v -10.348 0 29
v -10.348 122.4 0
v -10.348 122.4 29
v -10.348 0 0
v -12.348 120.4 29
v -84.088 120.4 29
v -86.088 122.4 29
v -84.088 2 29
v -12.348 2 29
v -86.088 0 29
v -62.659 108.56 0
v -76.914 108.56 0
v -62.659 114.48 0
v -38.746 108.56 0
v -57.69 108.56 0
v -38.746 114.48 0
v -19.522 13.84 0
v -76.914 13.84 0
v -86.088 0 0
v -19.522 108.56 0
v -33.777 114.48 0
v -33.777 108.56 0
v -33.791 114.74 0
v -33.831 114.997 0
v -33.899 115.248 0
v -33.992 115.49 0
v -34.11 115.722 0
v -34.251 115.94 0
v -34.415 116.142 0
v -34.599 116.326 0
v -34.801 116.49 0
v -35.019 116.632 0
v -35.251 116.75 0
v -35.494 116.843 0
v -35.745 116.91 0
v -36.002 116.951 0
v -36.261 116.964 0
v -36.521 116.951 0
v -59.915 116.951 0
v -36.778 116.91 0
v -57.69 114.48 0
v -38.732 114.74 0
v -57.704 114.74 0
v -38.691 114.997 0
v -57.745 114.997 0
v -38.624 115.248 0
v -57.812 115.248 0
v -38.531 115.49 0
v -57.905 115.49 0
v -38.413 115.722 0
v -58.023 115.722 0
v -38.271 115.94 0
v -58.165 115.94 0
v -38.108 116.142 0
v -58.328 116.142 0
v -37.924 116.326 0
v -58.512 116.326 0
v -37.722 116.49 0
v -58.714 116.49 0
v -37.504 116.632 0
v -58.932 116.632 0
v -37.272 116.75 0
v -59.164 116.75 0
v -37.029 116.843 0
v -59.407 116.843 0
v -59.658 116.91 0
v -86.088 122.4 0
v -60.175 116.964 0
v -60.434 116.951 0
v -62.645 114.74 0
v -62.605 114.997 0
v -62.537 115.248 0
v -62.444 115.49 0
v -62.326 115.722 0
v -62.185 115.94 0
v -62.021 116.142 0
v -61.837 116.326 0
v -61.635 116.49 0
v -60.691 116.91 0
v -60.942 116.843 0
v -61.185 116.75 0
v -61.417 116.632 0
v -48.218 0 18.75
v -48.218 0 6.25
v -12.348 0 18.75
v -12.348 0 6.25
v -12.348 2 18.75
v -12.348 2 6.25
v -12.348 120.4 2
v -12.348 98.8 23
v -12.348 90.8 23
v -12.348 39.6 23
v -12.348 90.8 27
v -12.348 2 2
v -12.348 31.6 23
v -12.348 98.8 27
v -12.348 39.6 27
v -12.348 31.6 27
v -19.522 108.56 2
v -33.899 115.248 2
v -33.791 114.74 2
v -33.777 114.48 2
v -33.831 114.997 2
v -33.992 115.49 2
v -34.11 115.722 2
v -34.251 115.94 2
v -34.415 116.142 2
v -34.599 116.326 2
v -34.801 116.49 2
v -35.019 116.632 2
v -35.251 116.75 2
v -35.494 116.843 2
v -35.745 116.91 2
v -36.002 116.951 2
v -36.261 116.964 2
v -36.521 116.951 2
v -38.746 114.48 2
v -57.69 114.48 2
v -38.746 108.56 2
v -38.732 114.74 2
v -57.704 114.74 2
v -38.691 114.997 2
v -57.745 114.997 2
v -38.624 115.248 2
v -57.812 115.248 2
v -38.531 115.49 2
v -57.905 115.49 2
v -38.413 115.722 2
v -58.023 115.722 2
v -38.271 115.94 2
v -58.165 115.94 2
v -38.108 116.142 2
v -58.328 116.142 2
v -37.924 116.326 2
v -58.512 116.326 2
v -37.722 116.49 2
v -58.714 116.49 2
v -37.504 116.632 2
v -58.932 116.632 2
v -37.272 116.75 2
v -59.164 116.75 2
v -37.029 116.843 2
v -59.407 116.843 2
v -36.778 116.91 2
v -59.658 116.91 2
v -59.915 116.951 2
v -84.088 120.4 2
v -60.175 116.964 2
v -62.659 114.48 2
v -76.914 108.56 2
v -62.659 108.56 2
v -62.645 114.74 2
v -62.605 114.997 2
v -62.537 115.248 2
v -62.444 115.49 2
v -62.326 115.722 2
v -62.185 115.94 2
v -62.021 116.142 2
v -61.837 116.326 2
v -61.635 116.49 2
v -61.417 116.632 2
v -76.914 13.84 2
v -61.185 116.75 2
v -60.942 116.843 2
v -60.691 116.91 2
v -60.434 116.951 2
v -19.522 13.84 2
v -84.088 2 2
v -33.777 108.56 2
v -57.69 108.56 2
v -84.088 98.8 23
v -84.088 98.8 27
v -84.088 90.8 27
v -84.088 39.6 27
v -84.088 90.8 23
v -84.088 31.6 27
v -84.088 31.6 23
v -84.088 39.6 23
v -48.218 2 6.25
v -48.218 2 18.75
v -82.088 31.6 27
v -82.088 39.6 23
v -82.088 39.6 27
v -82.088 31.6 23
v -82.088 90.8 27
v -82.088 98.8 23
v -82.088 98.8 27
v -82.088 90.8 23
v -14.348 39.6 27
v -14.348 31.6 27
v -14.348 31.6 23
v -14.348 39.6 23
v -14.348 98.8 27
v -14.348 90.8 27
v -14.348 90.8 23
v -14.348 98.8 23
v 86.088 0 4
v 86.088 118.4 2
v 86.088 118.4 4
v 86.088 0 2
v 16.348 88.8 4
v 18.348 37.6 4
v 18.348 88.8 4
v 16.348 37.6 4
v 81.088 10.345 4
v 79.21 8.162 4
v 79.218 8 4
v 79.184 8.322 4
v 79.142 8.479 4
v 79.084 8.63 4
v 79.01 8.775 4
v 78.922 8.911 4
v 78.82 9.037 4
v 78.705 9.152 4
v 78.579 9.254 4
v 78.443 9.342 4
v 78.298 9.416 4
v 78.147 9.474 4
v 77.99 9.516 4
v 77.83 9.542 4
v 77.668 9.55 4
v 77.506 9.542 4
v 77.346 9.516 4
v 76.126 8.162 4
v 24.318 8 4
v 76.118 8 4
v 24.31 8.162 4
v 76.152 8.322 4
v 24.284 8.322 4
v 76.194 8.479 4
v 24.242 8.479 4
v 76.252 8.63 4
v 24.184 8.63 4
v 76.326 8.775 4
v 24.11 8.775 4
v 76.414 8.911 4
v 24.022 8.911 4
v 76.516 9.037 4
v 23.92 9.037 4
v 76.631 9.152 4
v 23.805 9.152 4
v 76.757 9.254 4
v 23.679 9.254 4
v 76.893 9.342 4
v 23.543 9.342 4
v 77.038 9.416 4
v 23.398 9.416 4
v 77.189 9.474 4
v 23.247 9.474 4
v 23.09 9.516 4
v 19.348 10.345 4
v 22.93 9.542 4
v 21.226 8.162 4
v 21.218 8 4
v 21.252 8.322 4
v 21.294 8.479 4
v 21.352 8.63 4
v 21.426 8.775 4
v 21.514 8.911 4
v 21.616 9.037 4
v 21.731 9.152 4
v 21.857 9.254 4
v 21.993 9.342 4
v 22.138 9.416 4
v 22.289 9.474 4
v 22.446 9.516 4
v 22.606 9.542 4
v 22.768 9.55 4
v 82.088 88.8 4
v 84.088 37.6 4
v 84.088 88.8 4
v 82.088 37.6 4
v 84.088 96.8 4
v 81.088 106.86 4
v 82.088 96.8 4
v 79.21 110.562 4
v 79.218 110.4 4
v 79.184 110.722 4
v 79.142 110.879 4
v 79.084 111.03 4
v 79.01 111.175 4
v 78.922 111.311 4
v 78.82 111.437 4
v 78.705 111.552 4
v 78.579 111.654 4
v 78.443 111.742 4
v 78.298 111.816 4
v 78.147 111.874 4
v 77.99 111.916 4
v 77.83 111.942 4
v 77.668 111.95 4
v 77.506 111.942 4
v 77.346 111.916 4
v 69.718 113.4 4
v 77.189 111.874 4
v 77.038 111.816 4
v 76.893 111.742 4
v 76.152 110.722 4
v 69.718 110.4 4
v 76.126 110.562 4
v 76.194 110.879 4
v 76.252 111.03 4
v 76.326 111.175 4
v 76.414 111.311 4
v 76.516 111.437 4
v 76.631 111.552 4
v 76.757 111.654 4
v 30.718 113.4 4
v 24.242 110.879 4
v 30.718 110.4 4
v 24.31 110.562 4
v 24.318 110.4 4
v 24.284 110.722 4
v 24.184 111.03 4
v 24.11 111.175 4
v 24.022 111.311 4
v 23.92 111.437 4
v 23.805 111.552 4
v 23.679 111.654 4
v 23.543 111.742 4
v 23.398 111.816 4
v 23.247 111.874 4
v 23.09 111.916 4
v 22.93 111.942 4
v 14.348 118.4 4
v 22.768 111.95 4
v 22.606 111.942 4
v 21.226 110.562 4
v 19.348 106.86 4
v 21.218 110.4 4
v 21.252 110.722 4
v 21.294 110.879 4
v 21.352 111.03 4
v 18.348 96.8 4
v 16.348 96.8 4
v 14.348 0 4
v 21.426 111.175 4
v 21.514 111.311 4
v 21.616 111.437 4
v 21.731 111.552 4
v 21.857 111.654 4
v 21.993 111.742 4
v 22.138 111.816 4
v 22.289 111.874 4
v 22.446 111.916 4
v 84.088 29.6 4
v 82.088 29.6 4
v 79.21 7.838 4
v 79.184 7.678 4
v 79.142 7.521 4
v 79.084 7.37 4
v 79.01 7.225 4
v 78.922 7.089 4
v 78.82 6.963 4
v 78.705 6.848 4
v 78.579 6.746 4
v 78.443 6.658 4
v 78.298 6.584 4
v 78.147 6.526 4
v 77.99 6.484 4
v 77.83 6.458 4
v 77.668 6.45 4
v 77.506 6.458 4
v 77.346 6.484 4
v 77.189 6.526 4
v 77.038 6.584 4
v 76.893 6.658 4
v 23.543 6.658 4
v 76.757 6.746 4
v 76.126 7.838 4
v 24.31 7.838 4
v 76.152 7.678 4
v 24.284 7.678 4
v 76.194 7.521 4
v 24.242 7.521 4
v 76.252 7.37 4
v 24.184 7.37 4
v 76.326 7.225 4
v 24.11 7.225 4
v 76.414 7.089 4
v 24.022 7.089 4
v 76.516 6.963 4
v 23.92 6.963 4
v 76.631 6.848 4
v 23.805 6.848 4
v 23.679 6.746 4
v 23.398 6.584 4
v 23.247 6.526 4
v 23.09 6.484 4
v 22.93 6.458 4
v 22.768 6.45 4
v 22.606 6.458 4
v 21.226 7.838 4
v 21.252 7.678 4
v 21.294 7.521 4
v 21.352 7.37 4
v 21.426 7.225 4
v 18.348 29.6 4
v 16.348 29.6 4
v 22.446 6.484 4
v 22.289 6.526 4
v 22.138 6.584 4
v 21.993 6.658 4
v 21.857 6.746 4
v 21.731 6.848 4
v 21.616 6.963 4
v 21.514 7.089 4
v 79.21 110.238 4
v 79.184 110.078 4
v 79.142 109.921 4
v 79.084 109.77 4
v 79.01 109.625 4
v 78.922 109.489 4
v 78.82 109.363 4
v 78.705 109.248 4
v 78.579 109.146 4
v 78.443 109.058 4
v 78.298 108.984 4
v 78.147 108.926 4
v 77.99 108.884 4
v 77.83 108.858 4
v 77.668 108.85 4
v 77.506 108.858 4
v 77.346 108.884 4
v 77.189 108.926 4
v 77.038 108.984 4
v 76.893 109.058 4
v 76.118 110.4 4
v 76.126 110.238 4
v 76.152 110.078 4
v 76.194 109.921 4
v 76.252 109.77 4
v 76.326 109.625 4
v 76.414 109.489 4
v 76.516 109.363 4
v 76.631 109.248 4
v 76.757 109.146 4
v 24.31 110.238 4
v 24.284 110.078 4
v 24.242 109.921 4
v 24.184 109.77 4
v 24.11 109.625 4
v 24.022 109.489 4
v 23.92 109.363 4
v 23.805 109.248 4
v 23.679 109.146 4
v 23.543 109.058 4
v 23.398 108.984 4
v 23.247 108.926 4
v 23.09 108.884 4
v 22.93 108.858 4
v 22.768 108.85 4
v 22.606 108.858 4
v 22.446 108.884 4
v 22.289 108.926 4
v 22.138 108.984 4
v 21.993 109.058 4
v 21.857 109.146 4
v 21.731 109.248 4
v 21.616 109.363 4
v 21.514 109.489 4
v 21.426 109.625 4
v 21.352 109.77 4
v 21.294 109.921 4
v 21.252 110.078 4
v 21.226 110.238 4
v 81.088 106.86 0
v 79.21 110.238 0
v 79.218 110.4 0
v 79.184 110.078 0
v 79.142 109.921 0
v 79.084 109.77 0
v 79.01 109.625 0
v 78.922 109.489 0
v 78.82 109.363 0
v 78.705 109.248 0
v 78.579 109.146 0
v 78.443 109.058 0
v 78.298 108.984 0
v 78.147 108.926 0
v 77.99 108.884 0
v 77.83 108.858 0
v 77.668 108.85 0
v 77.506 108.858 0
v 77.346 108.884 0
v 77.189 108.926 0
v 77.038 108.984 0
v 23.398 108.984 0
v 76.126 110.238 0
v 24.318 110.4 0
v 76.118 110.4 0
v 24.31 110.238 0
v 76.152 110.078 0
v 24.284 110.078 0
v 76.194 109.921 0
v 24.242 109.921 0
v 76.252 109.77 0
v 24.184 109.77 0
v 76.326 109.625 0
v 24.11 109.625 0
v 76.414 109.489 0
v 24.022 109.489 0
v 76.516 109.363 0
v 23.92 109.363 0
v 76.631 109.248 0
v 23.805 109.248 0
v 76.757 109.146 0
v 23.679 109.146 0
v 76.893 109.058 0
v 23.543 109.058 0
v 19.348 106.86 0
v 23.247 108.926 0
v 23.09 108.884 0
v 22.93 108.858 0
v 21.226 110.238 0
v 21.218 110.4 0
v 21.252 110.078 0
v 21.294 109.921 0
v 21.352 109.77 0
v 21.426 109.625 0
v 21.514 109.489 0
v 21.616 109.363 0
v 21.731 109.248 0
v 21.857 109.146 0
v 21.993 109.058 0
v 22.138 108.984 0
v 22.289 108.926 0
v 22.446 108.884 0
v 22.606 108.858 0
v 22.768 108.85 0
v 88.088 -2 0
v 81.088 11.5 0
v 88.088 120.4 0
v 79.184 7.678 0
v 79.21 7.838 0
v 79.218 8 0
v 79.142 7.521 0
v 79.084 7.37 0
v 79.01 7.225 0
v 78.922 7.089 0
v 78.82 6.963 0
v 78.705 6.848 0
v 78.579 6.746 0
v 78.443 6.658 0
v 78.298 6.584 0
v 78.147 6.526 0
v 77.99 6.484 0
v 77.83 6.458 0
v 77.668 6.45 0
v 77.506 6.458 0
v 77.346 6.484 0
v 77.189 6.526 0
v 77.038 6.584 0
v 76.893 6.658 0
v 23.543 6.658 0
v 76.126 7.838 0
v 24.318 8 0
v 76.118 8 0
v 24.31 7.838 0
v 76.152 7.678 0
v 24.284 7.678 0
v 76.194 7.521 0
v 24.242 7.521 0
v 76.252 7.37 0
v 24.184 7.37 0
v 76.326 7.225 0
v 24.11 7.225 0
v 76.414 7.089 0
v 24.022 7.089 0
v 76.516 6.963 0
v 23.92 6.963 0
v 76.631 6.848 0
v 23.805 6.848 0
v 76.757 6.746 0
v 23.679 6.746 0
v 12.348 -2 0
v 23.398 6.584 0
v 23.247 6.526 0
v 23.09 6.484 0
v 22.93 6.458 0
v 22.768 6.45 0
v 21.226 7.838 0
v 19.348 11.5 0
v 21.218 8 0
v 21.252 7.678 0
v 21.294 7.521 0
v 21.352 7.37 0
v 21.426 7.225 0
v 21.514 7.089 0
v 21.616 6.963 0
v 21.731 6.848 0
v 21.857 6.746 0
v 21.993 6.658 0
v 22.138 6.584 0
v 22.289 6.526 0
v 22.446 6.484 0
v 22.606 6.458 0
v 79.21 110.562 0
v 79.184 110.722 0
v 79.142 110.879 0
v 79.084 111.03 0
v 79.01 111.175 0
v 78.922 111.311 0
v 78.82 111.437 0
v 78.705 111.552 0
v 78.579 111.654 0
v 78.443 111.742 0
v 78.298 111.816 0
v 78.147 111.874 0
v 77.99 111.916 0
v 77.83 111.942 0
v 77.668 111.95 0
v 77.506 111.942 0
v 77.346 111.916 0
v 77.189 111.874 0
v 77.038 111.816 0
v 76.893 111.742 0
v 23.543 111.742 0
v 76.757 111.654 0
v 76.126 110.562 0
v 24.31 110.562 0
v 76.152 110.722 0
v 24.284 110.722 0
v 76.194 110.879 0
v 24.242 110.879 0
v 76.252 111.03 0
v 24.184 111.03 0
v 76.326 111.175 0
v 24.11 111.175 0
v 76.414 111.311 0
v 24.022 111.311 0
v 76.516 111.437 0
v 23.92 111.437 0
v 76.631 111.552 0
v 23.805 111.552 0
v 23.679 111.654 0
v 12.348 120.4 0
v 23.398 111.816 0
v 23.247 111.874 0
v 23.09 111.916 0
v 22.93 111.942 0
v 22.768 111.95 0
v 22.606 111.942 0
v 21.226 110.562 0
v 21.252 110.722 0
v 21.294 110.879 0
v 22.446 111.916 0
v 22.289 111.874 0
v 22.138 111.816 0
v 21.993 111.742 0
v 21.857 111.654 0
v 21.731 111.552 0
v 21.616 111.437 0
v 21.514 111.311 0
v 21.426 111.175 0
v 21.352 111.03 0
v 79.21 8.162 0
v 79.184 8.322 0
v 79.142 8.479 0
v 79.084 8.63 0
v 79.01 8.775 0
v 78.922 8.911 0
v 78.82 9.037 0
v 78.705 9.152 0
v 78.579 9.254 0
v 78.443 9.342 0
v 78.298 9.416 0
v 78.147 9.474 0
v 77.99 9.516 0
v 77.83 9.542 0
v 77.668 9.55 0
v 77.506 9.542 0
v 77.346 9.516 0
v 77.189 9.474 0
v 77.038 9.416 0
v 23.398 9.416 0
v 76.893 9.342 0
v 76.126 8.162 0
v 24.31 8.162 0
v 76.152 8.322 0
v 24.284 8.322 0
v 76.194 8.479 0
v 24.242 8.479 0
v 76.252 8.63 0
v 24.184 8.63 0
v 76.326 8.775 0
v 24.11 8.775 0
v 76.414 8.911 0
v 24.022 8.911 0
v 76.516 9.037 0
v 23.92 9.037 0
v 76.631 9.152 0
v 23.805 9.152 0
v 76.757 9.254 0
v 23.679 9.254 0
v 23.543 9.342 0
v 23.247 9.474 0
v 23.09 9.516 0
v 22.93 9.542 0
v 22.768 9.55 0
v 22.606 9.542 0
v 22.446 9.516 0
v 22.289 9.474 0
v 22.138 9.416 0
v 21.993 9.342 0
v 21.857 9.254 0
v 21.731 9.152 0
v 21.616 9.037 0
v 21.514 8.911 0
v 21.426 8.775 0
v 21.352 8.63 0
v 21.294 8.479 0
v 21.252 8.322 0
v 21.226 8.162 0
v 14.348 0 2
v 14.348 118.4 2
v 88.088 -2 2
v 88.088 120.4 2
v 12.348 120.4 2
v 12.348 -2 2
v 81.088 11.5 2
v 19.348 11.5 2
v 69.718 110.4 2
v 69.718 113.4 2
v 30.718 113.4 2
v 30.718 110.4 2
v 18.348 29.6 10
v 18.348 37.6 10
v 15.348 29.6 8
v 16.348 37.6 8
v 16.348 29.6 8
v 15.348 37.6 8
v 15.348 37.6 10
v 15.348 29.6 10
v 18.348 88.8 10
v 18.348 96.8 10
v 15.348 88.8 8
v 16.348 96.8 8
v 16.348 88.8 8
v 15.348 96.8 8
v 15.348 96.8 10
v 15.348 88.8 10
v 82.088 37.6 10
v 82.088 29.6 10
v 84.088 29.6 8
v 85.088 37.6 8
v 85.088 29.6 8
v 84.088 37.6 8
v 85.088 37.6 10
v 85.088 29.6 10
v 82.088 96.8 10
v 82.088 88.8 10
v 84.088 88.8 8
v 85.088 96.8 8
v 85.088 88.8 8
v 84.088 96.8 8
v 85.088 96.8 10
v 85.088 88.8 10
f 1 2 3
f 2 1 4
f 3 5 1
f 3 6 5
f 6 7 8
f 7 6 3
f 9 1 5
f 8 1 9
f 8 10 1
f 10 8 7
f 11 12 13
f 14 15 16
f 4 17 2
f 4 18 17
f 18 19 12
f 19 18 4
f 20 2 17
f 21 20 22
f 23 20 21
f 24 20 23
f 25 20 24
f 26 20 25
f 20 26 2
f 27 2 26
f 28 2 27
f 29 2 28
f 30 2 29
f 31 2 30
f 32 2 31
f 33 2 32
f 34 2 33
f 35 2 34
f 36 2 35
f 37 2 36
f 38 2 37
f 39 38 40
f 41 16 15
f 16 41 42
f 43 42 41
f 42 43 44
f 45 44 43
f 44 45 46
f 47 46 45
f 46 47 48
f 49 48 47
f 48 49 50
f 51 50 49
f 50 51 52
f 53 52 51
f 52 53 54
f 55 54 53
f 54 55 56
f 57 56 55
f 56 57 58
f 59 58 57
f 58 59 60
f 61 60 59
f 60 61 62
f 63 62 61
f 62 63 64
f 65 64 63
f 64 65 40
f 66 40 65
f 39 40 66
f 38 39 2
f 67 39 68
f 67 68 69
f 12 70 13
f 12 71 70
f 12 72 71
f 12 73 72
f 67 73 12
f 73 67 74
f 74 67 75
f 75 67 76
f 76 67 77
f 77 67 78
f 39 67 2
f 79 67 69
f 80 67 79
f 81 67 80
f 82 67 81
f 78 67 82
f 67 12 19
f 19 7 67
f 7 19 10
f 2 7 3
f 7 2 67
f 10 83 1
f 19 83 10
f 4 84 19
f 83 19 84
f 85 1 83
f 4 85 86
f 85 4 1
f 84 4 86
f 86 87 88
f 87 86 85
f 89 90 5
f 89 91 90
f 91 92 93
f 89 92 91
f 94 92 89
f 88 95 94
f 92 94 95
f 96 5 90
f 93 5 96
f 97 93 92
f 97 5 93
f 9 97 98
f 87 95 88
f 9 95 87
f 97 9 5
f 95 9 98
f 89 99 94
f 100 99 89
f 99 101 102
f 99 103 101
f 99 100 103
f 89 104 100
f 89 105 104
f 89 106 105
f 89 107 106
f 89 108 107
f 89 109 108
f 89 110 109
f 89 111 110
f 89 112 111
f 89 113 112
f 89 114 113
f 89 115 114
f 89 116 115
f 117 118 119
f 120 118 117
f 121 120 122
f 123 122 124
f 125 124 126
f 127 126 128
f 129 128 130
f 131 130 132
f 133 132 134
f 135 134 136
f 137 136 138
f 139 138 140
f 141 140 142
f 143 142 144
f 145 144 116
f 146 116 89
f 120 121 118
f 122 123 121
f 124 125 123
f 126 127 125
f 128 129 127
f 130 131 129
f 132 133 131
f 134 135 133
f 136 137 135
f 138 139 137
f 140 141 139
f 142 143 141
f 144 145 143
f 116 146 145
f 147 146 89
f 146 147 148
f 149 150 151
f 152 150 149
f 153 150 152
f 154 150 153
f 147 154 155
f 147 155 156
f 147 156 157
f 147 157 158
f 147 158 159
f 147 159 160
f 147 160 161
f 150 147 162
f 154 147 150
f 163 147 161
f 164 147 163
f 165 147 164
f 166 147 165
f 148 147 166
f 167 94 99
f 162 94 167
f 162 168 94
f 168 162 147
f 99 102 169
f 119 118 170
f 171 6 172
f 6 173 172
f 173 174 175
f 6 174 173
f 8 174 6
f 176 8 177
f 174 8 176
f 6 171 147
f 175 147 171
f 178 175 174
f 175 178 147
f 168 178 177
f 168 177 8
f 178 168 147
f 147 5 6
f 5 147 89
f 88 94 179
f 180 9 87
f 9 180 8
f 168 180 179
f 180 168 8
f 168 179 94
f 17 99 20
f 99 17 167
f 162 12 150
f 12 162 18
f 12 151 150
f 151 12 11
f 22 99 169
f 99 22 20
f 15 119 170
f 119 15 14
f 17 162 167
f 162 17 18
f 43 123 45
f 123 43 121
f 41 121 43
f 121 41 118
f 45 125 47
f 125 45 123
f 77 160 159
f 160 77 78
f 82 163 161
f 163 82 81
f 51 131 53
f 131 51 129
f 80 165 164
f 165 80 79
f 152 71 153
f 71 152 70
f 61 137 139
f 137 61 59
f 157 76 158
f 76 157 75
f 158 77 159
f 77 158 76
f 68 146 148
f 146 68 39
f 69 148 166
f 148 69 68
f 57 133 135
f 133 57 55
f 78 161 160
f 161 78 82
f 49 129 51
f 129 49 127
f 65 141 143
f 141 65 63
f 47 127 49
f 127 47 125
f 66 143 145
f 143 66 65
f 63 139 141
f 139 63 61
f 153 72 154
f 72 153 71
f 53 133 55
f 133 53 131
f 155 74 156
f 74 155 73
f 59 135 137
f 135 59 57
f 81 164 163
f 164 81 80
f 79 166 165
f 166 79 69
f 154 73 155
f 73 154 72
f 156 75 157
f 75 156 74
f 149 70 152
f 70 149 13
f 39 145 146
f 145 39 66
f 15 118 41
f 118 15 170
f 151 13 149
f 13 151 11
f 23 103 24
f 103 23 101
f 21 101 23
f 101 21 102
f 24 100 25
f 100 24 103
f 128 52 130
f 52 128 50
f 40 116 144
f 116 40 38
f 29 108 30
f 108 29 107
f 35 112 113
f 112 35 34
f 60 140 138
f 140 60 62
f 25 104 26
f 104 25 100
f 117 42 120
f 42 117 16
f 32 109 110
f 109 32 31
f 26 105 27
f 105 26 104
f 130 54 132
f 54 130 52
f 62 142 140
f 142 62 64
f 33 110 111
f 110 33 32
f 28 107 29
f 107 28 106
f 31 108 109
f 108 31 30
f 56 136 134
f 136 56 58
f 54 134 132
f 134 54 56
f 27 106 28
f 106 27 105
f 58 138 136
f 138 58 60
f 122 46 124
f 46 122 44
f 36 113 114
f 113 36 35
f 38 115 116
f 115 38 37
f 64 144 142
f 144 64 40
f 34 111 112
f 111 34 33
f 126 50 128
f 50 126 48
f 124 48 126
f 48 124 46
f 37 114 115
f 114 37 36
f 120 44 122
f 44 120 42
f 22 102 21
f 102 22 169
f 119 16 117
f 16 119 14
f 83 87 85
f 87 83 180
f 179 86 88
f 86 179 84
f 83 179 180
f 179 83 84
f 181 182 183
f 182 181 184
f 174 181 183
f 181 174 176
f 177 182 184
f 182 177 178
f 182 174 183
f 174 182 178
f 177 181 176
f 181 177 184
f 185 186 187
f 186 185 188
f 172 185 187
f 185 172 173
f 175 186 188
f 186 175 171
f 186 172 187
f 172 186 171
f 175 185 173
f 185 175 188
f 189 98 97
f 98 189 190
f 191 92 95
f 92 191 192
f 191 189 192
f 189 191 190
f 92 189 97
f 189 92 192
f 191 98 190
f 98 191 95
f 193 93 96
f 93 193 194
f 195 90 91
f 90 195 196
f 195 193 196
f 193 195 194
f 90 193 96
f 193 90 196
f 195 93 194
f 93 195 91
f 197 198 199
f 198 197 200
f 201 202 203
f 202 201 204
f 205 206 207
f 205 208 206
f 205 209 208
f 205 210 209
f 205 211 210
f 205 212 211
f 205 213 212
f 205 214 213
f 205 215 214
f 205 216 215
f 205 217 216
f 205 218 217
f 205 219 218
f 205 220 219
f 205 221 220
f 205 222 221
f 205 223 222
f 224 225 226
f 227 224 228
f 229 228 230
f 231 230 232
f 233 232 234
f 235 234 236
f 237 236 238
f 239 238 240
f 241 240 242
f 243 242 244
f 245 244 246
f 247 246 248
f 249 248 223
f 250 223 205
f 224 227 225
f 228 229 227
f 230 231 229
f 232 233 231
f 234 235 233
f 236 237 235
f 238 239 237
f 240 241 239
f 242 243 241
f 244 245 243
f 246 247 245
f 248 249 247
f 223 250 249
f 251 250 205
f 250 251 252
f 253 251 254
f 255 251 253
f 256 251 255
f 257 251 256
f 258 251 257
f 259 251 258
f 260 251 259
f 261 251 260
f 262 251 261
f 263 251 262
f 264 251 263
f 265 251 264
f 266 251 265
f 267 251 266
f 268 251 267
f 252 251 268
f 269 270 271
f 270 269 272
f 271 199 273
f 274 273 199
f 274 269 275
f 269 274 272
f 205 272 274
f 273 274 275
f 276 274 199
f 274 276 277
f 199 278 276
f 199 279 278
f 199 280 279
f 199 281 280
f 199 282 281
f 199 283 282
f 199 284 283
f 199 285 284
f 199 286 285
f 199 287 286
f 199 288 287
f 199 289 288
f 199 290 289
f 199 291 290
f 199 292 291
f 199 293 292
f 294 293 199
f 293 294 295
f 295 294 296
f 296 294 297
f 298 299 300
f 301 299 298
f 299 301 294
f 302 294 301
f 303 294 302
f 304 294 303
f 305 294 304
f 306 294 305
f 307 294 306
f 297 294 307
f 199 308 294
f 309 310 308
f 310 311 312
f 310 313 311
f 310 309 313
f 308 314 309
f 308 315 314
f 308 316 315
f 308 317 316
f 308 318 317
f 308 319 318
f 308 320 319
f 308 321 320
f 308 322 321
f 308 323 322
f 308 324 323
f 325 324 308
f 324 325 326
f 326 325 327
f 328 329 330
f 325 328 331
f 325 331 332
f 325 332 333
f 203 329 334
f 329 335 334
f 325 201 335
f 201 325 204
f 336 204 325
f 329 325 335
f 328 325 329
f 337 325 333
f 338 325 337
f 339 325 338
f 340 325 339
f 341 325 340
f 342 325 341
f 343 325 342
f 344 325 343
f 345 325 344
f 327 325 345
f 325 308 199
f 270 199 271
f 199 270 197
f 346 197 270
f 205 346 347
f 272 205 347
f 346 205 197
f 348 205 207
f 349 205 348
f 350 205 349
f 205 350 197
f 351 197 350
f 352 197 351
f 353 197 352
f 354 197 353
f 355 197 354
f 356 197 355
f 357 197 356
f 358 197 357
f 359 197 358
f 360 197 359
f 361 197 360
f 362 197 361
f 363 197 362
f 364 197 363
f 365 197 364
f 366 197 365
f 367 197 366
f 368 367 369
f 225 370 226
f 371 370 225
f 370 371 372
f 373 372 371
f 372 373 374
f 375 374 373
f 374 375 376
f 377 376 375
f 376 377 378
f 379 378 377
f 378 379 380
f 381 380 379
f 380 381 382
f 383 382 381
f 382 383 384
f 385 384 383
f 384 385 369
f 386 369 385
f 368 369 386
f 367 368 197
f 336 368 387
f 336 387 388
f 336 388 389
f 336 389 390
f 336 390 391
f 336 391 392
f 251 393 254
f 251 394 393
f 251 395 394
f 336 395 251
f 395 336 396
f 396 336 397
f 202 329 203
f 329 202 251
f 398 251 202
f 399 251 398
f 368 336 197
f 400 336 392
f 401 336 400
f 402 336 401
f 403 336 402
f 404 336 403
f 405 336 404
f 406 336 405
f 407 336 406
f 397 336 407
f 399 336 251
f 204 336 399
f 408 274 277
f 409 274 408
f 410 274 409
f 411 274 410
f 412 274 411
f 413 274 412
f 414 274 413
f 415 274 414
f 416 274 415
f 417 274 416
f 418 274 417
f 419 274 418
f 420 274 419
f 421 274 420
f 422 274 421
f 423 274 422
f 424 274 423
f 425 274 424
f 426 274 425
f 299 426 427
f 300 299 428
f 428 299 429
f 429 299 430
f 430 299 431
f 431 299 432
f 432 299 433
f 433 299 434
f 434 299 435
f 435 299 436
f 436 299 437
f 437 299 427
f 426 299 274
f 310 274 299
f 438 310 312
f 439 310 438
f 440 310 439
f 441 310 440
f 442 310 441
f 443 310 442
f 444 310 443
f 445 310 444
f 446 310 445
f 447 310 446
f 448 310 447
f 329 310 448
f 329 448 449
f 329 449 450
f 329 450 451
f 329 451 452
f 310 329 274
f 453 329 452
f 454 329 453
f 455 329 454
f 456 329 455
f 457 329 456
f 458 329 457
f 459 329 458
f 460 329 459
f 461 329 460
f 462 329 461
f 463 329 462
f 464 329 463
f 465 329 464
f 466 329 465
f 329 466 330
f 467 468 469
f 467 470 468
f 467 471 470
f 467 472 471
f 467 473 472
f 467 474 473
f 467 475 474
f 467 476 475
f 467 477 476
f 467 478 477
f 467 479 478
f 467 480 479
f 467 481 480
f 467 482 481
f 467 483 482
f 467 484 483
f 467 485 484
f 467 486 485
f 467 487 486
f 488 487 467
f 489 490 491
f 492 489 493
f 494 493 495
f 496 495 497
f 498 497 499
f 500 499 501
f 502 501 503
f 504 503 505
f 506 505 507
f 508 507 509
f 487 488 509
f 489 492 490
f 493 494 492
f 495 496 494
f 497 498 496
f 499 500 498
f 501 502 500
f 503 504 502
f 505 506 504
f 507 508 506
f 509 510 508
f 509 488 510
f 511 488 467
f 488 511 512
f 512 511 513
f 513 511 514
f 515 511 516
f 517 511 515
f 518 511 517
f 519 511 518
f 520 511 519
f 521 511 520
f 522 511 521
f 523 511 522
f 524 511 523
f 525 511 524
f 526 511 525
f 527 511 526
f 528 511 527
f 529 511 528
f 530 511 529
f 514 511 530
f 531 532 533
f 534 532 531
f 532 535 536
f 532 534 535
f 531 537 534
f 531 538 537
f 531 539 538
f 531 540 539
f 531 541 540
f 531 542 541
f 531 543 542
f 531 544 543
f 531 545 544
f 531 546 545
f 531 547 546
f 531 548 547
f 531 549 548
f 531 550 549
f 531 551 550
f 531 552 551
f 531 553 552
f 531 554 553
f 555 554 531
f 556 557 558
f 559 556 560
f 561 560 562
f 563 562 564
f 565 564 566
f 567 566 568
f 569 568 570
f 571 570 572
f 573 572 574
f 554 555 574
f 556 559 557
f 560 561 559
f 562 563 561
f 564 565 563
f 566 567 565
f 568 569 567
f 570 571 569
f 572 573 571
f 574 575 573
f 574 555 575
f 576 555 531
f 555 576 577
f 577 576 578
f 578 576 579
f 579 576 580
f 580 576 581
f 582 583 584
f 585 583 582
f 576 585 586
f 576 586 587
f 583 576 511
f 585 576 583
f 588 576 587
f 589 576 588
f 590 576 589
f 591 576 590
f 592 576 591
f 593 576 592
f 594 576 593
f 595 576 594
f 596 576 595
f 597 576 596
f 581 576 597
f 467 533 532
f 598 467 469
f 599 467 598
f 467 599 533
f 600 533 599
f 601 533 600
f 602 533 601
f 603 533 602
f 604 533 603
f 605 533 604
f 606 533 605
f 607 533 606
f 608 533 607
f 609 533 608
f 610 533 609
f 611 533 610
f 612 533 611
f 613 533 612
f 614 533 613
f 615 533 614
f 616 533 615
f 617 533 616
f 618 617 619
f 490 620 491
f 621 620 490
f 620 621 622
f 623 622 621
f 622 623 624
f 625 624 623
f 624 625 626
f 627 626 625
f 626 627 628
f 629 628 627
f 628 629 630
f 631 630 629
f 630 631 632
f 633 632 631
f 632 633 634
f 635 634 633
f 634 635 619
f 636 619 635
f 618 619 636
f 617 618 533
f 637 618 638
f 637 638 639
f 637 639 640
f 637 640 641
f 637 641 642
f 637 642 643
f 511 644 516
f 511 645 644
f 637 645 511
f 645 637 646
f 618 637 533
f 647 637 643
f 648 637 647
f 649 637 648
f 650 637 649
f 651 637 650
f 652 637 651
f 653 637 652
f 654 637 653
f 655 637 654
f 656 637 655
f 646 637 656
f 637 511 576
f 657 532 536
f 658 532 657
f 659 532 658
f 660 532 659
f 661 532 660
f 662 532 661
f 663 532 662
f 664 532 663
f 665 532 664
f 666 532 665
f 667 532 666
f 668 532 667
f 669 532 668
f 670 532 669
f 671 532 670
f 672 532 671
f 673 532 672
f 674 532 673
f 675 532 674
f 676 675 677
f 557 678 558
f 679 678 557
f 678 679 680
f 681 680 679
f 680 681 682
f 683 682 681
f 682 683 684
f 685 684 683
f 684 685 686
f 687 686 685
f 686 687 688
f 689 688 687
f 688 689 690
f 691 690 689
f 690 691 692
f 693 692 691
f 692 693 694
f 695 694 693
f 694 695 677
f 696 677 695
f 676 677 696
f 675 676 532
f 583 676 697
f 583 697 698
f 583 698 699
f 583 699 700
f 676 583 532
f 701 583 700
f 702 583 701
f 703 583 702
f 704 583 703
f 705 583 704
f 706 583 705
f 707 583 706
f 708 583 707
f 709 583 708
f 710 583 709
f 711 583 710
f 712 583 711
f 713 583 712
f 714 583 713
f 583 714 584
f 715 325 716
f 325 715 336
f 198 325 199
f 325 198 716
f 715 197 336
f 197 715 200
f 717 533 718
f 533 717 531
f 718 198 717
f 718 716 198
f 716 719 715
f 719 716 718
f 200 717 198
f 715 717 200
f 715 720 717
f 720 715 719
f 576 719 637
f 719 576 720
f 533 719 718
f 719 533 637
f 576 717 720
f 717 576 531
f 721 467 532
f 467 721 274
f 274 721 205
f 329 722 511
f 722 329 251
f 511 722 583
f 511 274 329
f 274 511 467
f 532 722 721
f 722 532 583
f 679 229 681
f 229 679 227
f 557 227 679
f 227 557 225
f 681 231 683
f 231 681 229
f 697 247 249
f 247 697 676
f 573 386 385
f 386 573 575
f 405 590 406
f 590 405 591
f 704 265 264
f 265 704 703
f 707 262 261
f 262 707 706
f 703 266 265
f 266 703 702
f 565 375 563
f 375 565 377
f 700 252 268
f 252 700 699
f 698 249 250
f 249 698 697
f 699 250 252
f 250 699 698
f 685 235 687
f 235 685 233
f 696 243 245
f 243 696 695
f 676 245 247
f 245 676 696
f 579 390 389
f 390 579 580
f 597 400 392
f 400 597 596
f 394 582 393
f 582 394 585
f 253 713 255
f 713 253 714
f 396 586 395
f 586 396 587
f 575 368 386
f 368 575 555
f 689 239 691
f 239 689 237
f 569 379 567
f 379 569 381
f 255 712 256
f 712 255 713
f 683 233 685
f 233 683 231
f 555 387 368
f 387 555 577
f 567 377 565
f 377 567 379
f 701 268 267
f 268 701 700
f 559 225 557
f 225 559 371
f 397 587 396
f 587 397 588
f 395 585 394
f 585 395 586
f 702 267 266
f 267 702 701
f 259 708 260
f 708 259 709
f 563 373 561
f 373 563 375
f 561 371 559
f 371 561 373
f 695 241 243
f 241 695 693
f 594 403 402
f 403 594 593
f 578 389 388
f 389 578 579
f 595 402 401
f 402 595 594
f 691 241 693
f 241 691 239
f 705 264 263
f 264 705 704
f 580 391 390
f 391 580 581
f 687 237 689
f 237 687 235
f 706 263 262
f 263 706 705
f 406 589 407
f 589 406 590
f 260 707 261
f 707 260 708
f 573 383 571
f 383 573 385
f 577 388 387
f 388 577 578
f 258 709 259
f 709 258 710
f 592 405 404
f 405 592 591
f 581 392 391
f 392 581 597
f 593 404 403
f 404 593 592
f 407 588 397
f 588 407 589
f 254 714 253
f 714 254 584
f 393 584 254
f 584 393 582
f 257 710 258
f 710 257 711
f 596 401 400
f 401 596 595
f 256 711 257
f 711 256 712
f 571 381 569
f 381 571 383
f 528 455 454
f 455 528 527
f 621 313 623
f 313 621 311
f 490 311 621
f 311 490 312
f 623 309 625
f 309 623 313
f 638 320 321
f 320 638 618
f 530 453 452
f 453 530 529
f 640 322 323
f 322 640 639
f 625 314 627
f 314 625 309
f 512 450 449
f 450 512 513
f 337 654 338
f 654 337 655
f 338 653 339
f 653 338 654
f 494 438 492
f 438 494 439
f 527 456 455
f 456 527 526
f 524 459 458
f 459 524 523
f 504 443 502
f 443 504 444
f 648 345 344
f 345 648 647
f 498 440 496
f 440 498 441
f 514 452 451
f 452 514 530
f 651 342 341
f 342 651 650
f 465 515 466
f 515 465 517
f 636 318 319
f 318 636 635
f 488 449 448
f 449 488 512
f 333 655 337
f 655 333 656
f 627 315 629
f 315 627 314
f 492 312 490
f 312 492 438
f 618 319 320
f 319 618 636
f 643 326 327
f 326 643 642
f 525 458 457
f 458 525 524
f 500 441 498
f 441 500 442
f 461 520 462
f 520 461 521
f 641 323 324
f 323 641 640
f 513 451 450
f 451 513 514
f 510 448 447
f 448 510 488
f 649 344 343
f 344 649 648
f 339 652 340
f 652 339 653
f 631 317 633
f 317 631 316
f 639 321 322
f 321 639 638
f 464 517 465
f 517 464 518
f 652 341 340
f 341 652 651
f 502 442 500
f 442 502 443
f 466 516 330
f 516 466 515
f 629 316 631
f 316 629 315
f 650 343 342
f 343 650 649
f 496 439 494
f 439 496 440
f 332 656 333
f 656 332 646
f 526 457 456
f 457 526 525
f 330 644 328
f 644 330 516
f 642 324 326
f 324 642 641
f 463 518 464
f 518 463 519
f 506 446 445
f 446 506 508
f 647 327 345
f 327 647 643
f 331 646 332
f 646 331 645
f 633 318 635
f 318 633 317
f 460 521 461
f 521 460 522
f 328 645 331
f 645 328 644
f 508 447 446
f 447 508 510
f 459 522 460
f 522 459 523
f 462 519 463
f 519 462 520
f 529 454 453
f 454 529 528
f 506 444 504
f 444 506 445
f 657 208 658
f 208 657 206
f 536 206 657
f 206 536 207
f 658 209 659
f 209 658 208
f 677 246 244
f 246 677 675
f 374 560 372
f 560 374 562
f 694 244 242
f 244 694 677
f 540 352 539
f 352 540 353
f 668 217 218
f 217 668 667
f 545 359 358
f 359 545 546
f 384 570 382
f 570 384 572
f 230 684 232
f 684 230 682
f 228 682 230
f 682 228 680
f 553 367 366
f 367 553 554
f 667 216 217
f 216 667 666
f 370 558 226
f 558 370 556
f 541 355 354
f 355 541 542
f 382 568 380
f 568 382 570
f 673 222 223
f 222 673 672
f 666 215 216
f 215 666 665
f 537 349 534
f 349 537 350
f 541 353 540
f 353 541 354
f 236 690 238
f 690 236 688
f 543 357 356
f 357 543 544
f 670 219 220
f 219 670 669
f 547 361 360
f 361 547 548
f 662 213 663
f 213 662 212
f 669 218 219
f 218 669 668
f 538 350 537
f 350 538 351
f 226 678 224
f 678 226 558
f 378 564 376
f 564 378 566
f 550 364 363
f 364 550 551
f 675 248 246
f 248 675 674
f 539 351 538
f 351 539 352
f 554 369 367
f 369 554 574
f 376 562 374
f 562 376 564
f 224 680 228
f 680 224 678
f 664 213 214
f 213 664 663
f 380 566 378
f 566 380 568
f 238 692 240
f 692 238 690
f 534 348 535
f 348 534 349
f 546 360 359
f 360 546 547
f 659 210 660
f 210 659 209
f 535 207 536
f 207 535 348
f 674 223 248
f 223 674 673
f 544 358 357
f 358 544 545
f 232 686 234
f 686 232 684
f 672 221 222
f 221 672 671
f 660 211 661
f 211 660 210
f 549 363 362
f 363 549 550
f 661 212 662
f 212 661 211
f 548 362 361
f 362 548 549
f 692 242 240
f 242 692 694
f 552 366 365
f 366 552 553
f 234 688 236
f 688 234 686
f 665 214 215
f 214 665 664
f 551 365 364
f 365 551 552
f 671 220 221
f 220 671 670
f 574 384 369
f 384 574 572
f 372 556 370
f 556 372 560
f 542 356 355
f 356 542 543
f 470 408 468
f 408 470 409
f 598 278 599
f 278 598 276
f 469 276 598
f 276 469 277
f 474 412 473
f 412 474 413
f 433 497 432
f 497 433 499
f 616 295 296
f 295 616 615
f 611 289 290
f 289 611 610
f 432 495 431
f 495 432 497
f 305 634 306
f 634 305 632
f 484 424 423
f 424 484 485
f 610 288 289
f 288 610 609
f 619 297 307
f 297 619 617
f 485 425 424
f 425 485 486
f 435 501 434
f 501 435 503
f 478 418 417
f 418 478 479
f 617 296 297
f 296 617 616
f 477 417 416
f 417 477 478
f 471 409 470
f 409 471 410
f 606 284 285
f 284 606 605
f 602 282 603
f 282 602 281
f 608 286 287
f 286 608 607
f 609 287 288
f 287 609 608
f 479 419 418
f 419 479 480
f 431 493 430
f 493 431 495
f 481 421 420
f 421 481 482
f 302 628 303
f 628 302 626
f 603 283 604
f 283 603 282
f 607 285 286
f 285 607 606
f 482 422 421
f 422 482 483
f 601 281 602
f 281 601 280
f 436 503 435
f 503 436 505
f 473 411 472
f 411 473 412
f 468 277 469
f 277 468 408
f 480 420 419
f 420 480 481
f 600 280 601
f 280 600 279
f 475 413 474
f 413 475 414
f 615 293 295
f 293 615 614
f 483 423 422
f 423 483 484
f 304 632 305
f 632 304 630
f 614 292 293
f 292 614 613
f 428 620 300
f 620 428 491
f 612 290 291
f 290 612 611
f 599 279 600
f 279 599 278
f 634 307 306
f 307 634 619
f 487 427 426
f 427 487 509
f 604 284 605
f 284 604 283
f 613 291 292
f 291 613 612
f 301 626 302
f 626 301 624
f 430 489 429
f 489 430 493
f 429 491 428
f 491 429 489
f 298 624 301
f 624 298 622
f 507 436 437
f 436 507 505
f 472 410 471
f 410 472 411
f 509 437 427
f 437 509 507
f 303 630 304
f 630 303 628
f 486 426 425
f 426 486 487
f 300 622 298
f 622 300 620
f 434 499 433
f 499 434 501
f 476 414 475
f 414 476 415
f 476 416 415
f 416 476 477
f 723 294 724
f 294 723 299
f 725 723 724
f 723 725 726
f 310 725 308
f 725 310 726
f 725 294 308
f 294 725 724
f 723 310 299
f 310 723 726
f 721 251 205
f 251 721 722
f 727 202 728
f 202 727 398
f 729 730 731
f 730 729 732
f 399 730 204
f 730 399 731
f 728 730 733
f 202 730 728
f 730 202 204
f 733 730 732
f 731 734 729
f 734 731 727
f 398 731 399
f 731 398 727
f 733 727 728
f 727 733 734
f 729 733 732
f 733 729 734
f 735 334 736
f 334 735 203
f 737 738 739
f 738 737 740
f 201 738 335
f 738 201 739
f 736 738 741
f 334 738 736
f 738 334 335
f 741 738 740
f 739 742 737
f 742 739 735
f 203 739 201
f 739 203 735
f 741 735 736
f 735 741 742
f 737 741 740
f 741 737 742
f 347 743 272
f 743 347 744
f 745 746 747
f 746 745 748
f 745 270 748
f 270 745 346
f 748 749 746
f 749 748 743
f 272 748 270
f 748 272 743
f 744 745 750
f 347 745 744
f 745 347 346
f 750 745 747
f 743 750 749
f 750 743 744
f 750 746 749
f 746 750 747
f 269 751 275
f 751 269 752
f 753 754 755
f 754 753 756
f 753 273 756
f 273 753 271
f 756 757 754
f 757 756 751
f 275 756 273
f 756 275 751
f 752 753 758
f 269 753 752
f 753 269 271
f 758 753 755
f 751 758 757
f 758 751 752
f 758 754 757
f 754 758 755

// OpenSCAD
// PDX Hackerspace Exit Poll
// https://www.aliexpress.us/item/3256802965763349.html
// https://www.aliexpress.us/item/3256804835346770.html
$fn = 60;

render_stl = 0;
// 3.5"
// display_width = 56;
// display_height = 98;

// 4.0"
display_width = 61.74;
display_height = 108.4;

hole_radius = 1.55; //For a diameter of 3.1, 3mm+clearance for an M3 Screw
hole_width_offset = 3.42;
hole_height_offset = 3;

bottom_margin = 6.5;
top_margin = 6.54;


// "active area" 48.96x73.44(mm)
//active_width = 48.96;
//active_height = 73.44;

led_width = display_width;
led_height = display_height - bottom_margin - top_margin;

case_width = display_width + 10;
case_height = display_height + 10;
case_depth = 25;

thickness = 2;

screw_hole_diameter = 5/32*25.4 + 1;;

catch_height = 4;
catch_width = 8;

usb_cutout_width = 20;
usb_cutout_height = 8;

module catch() {
    cube([thickness, catch_width, catch_height]);
    translate([-1, 0, catch_height])
      cube([thickness + 1, catch_width, 2]);
}

module cover() {
difference() {
    union() {
      cube([case_width, case_height, thickness*2]);
      translate([-thickness, -thickness, 0])
        cube([case_width + thickness*2, case_height + thickness*2, thickness]);
      }
    //Cut hole for display
    translate([(case_width - led_width)/2, bottom_margin+5, -1])
      cube([led_width, led_height, thickness*2+2]);
    //Screw Holes
    translate([5 + hole_width_offset, 5 + hole_height_offset, 0])
      cylinder(h = thickness*2, r = hole_radius);
    translate([5 + hole_width_offset, case_height - (5 + hole_height_offset), 0])
      cylinder(h = thickness*2, r = hole_radius);
    translate([case_width - (5 + hole_width_offset), 5 + hole_height_offset, 0])
      cylinder(h = thickness*2, r = hole_radius);
    translate([case_width - (5 + hole_width_offset), case_height - (5 + hole_height_offset), 0])
      cylinder(h = thickness*2, r = hole_radius);

      //Cut out a slot for the touchscreen header pins to sit in
      top_to_center_pin_distance = 6.5;

      translate([case_width/2, case_height-         top_to_center_pin_distance, (thickness*2)-0.5]){
        cube([39,3,3],true);
      }

      //Add a lip at the bottom to keep from stressing the display to pcb connection
      translate([case_width/2, bottom_margin+5, thickness]){
          rotate([30,0,0]) translate([0,1,thickness*2])
            cube([led_width, 2, thickness*4],true);
      }
  }


  module left_side_catches(){
      translate([thickness, case_height/4, thickness*2]) {
          catch();
      }
      translate([thickness, 3*case_height/4, thickness*2]) {
          catch();
      }
  }

  //Build the left side
  left_side_catches();

  //Then the right (with mirroring)
  translate([case_width, 0,0]) mirror([1,0,0]) {
     left_side_catches();
  }
}

module box() {
    difference() {
      cube([case_width + thickness*2, case_height+thickness*2, case_depth+thickness*2]);

      translate([thickness, thickness, thickness])
        cube([case_width, case_height, case_depth + thickness]);
      translate([thickness + case_width/10, thickness + case_height/10, 0])
        cube([8*case_width/10, 8*case_height/10, thickness]);

      translate([thickness + case_width/3, thickness + case_height*19/20, 0])
        cylinder(h = thickness*2, d = screw_hole_diameter);

      translate([thickness + case_width/3 - screw_hole_diameter/2, thickness + case_height*18/20, 0])
        cube([screw_hole_diameter, case_height/20, thickness]);

      translate([thickness + 2*case_width/3, thickness + case_height*19/20, 0])
        cylinder(h = thickness*2, d = screw_hole_diameter);
      translate([thickness + 2*case_width/3 - screw_hole_diameter/2, thickness + case_height*18/20, 0])
        cube([screw_hole_diameter, case_height/20, thickness]);

      translate([(case_width + thickness*2 - usb_cutout_width)/2, 0, case_depth/4])
        cube([usb_cutout_width, thickness, usb_cutout_height]);
    }

    translate([thickness, thickness + case_height/4, thickness+case_depth-catch_height])
      cube([thickness, catch_width, catch_height]);
     translate([thickness, thickness + 3*case_height/4, thickness+case_depth-catch_height])
      cube([thickness, catch_width, catch_height]);
    translate([case_width, thickness + case_height/4, thickness+case_depth-catch_height])
      cube([thickness, catch_width, catch_height]);
     translate([case_width, thickness + 3*case_height/4, thickness+case_depth-catch_height])
      cube([thickness, catch_width, catch_height]);
}

module box_big_notch() {
    difference() {
      cube([case_width + thickness*2, case_height+thickness*2, case_depth+thickness*2]);

      // hollow out the inside of the box
      translate([thickness, thickness, thickness])
        cube([case_width, case_height, case_depth + thickness]);

      // save filament by cutting out most of the back panel
      translate([thickness + case_width/10, thickness + case_height/10, 0])
        cube([8*case_width/10, 8*case_height/10, thickness]);

      // knockouts for hanging the box on screws
      translate([thickness + case_width/3, thickness + case_height*19/20, 0])
        cylinder(h = thickness*2, d = screw_hole_diameter);
      translate([thickness + case_width/3 - screw_hole_diameter/2, thickness + case_height*18/20, 0])
        cube([screw_hole_diameter, case_height/20, thickness]);
      translate([thickness + 2*case_width/3, thickness + case_height*19/20, 0])
        cylinder(h = thickness*2, d = screw_hole_diameter);
      translate([thickness + 2*case_width/3 - screw_hole_diameter/2, thickness + case_height*18/20, 0])
        cube([screw_hole_diameter, case_height/20, thickness]);

      // USB cable knockout
      translate([(case_width + thickness*2)/2, 0, case_depth/4])
        cube([case_width/2, thickness, case_depth/2]);

      // knockout for LED cables
//      translate([(case_width- 10 + thickness)/2, case_height+thickness, case_depth + thickness*2 - 10])
//        cube([10, thickness, 10]);
    }

    translate([thickness, thickness + case_height/4, thickness+case_depth-catch_height])
      cube([thickness, catch_width, catch_height]);
     translate([thickness, thickness + 3*case_height/4, thickness+case_depth-catch_height])
      cube([thickness, catch_width, catch_height]);
    translate([case_width, thickness + case_height/4, thickness+case_depth-catch_height])
      cube([thickness, catch_width, catch_height]);
     translate([case_width, thickness + 3*case_height/4, thickness+case_depth-catch_height])
      cube([thickness, catch_width, catch_height]);
}

module base() {
    d = case_height + thickness*4;
    translate([d*.5/4, d*1.5/3, 0])
      linear_extrude(thickness) {
        scale([.5, 1.5])
          circle(d = d);
    }

  translate([0, 0, thickness])
  difference() {
    cube([case_depth + thickness*5, case_height + thickness*4, 7]);
    translate([thickness, thickness, 0])
      cube([case_depth + thickness*3, case_height + thickness*2, 7]);
  }
}


// Render the case and box side by side about origin for easy viewing
module main(){
    translate([-(case_width*1.2), 0, 0]){
        box_big_notch();
    }

    translate([(case_width*0.2), 0, 0]){
        cover();
    }
}

//Hack to render a specific part
// Use openscad -D render_stl=# -o <outfile> exit-poll.scad to render a specific part
if(render_stl==0)
    main();
if(render_stl==1)
    box_big_notch();
if(render_stl==2)
    cover();
